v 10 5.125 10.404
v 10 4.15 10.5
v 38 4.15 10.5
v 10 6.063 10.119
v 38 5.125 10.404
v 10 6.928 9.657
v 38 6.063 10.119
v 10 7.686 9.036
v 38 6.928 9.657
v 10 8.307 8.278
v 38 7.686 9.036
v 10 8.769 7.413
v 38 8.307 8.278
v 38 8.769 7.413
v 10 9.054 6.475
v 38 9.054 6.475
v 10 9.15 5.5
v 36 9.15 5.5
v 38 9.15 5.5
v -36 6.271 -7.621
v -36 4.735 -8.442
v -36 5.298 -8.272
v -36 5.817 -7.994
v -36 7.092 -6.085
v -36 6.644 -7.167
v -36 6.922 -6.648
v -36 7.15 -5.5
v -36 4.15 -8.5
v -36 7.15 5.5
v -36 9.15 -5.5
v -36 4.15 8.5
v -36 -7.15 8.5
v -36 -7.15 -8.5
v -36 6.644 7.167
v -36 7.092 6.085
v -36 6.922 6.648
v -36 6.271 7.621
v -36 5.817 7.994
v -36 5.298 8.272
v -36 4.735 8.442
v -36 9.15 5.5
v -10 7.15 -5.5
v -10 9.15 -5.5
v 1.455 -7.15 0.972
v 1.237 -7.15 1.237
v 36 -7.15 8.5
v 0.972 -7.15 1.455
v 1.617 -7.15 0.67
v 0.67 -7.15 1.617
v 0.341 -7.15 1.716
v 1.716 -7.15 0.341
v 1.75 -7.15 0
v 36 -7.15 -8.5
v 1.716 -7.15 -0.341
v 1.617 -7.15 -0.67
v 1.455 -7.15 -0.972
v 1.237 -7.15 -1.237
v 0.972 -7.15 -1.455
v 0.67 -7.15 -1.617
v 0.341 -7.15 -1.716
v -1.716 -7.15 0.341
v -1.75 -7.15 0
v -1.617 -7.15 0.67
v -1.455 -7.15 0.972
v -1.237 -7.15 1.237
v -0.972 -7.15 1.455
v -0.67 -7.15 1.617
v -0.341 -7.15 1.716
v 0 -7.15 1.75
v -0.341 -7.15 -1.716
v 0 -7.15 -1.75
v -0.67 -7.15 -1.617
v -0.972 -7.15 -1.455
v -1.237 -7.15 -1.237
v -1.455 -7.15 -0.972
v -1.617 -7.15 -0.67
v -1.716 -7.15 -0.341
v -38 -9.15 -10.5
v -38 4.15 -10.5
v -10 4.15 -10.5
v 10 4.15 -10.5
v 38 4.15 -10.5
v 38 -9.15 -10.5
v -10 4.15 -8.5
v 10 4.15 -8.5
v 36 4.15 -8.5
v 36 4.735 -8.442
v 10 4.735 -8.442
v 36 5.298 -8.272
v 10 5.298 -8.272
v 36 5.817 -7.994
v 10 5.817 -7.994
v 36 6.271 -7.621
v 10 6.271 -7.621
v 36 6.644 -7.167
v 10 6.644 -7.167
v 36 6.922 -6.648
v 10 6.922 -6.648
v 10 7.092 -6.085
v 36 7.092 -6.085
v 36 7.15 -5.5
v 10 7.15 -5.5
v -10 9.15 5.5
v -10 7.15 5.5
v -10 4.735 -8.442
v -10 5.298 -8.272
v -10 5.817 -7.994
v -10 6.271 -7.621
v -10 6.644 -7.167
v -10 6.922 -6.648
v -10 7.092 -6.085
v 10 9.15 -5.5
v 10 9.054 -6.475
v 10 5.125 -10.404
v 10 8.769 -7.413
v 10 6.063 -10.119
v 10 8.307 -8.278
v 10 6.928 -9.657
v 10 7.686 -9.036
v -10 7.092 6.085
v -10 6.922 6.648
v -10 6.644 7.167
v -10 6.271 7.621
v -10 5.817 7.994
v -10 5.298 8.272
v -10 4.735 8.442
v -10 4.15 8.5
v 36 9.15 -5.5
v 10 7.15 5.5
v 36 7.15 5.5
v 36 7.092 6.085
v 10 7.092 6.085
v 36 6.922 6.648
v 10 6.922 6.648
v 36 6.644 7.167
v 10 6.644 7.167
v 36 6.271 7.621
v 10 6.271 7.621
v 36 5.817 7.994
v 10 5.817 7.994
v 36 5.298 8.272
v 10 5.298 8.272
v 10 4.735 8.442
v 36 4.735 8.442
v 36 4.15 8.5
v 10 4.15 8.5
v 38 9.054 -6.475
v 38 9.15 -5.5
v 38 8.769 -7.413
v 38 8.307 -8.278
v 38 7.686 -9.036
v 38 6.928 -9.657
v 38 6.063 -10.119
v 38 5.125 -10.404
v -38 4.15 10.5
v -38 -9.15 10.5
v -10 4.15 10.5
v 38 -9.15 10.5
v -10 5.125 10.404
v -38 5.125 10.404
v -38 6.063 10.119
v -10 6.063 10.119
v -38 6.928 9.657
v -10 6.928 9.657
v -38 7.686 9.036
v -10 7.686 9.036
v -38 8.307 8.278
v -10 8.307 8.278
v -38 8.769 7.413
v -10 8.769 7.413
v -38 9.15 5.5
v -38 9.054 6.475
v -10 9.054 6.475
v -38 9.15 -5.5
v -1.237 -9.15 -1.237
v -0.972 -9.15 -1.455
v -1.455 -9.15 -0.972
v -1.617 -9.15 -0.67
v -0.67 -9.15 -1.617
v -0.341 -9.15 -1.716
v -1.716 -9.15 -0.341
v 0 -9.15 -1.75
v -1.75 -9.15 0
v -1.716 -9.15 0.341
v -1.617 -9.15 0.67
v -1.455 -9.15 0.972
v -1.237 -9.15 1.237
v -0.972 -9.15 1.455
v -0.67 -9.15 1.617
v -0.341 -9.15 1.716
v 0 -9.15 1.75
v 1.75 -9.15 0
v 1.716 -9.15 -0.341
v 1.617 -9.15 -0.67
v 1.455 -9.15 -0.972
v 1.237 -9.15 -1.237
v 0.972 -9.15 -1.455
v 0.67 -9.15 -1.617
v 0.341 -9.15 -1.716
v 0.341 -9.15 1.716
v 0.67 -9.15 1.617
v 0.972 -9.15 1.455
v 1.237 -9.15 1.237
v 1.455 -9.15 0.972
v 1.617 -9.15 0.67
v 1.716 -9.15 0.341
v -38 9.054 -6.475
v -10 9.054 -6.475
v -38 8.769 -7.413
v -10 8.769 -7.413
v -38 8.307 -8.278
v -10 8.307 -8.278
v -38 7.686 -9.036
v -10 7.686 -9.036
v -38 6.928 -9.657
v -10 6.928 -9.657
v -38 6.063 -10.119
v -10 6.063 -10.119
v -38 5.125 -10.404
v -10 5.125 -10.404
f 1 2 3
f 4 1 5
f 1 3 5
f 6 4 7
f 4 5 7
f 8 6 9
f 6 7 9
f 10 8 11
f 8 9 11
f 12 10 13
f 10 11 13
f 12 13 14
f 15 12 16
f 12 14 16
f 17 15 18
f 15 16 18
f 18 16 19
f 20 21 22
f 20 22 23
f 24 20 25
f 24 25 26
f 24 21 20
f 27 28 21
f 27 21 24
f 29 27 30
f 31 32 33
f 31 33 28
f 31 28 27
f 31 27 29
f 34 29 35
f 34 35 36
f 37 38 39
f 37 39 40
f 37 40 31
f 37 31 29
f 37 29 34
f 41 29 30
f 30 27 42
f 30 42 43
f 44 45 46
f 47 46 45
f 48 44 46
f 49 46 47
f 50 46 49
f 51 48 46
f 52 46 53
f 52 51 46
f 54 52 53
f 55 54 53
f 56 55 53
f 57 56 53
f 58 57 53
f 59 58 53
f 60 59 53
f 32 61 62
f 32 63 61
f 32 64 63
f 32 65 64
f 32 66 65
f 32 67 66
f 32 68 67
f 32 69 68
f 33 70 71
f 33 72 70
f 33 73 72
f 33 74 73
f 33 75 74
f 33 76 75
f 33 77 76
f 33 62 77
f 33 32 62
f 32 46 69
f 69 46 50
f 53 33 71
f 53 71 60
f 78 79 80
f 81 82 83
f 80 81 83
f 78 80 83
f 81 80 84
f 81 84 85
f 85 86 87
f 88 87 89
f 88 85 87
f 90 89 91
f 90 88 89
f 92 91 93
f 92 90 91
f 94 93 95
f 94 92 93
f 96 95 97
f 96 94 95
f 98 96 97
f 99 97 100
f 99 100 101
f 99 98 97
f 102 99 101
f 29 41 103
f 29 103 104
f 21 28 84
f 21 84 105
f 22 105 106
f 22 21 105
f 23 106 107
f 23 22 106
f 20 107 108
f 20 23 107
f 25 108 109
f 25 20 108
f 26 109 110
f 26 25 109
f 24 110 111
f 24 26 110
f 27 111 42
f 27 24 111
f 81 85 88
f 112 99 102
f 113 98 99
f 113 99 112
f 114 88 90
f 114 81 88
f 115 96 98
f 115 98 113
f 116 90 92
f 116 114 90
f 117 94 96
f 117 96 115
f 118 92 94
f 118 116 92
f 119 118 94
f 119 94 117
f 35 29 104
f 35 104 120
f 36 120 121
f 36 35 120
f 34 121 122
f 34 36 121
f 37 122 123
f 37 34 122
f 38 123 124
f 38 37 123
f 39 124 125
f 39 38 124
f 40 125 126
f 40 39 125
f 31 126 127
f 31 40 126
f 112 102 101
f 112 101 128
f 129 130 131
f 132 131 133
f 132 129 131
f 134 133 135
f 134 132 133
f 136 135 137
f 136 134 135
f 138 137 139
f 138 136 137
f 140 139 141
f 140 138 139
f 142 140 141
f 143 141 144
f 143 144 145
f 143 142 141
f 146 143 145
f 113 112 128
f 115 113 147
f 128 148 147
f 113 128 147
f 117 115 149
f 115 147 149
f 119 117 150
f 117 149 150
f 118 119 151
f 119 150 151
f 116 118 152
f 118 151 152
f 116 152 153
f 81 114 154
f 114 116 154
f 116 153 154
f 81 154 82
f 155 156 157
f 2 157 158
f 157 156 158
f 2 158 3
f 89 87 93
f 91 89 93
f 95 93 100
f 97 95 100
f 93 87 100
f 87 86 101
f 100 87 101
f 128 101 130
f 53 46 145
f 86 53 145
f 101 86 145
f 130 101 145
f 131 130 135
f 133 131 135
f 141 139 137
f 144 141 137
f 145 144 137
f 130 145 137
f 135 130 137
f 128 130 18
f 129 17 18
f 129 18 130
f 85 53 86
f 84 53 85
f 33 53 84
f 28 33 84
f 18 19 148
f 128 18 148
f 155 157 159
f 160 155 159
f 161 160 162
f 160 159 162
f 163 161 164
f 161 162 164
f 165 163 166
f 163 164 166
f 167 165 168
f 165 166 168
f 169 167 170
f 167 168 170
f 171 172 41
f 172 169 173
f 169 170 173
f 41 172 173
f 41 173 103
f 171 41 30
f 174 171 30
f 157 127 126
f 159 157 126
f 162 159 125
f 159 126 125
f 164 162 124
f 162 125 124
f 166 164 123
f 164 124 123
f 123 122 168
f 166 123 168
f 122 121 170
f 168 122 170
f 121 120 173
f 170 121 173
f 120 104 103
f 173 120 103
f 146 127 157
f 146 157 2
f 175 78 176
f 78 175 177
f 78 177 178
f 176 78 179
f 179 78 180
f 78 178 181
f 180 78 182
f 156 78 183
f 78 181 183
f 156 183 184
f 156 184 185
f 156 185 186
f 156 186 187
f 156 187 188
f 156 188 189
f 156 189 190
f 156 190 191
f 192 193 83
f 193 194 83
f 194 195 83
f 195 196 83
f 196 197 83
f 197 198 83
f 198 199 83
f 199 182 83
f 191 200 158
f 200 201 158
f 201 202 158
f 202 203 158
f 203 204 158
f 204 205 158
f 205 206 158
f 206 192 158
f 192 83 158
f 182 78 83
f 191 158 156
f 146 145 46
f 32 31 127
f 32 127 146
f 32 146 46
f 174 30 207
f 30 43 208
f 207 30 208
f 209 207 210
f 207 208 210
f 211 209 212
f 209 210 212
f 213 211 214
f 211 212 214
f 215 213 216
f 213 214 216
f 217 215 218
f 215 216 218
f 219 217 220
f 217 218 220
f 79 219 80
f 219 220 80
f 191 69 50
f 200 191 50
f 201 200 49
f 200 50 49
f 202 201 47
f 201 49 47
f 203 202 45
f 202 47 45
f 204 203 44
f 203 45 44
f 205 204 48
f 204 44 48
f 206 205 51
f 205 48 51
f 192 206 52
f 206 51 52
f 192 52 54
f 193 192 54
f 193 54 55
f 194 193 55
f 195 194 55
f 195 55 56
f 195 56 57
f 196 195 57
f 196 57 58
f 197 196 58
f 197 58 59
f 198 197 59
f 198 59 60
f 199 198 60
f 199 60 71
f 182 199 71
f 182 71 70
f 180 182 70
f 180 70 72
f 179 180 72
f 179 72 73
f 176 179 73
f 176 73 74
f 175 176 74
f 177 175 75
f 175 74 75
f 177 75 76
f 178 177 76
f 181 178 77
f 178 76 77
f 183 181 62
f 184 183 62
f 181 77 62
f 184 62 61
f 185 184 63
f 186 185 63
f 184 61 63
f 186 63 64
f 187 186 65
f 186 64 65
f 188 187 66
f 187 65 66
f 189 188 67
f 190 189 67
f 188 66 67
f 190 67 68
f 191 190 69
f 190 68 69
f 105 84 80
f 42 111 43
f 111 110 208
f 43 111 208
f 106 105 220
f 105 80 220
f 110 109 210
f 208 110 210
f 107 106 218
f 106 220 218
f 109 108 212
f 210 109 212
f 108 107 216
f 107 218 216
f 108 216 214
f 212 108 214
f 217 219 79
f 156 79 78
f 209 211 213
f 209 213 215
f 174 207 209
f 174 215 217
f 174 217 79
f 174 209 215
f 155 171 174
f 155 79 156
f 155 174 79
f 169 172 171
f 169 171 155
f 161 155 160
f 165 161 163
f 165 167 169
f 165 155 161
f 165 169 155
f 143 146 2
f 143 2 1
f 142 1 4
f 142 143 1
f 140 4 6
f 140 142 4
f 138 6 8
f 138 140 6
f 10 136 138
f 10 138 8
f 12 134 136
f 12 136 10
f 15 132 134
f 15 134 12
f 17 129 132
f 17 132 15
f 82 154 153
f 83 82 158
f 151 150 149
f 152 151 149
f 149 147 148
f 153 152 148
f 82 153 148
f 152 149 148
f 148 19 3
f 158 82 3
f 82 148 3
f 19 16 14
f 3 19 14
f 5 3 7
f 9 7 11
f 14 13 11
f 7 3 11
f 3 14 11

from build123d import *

# Parameters (mm, degrees)
BODY_DEPTH          = 38
SHELL1_START        = -36
SHELL1_DEPTH        = 72
HOLE_DEPTH          = 41.471872949
HOLE_DEPTH_BACK     = 41.471872949
SKETCH2_W           = 20
SKETCH2_H           = 5
SKETCH3_R           = 1.75
FIXATION_HOLE_DEPTH = 43.660754799


# Read off the part's stored shape, not the designer's step: Shell1
with BuildPart() as part:
    # Sketch1 → Body (new, symmetric)
    with BuildSketch(Plane(origin=(0, 0, 0), x_dir=(0, 0, -1), z_dir=(1, 0, 0))):
        with BuildLine():
            Line((10.5, -9.15), (-10.5, -9.15))
            Line((-10.5, -9.15), (-10.5, 4.15))
            ThreePointArc((-10.5, 4.15), (-9.035533906, 7.685533906), (-5.5, 9.15))
            Line((-5.5, 9.15), (5.5, 9.15))
            ThreePointArc((5.5, 9.15), (9.035533906, 7.685533906), (10.5, 4.15))
            Line((10.5, 4.15), (10.5, -9.15))
        make_face()
    extrude(amount=BODY_DEPTH, both=True)

    # Shell1 outline → Shell1 (cut)
    with BuildSketch(Plane.YZ.offset(SHELL1_START)):
        with BuildLine():
            Line((7.15, -5.5), (9.15, -5.5))
            Line((9.15, -5.5), (9.15, 5.5))
            Line((9.15, 5.5), (7.15, 5.5))
            ThreePointArc((7.15, 5.5), (6.271320344, 7.621320344), (4.15, 8.5))
            Line((4.15, 8.5), (-7.15, 8.5))
            Line((-7.15, 8.5), (-7.15, -8.5))
            Line((-7.15, -8.5), (4.15, -8.5))
            ThreePointArc((4.15, -8.5), (6.271320344, -7.621320344), (7.15, -5.5))
        make_face()
    extrude(amount=SHELL1_DEPTH, mode=Mode.SUBTRACT)

    # Sketch2 → Hole (cut, two sides: drawn at the far end of the back side and taken through both)
    with BuildSketch(Plane.XY.offset(-HOLE_DEPTH_BACK)):
        with Locations((0, 6.65)):
            Rectangle(SKETCH2_W, SKETCH2_H)
    extrude(amount=HOLE_DEPTH + HOLE_DEPTH_BACK, mode=Mode.SUBTRACT)

    # Sketch3 → Fixation_Hole (cut, through all)
    with BuildSketch(Plane(origin=(0, -7.15, 0), x_dir=(1, 0, 0), z_dir=(0, 1, 0))):
        with Locations(Location((0, 0, 0), (0, 0, 270))):
            Circle(SKETCH3_R)
    extrude(amount=-FIXATION_HOLE_DEPTH, mode=Mode.SUBTRACT)


solid = part.part
